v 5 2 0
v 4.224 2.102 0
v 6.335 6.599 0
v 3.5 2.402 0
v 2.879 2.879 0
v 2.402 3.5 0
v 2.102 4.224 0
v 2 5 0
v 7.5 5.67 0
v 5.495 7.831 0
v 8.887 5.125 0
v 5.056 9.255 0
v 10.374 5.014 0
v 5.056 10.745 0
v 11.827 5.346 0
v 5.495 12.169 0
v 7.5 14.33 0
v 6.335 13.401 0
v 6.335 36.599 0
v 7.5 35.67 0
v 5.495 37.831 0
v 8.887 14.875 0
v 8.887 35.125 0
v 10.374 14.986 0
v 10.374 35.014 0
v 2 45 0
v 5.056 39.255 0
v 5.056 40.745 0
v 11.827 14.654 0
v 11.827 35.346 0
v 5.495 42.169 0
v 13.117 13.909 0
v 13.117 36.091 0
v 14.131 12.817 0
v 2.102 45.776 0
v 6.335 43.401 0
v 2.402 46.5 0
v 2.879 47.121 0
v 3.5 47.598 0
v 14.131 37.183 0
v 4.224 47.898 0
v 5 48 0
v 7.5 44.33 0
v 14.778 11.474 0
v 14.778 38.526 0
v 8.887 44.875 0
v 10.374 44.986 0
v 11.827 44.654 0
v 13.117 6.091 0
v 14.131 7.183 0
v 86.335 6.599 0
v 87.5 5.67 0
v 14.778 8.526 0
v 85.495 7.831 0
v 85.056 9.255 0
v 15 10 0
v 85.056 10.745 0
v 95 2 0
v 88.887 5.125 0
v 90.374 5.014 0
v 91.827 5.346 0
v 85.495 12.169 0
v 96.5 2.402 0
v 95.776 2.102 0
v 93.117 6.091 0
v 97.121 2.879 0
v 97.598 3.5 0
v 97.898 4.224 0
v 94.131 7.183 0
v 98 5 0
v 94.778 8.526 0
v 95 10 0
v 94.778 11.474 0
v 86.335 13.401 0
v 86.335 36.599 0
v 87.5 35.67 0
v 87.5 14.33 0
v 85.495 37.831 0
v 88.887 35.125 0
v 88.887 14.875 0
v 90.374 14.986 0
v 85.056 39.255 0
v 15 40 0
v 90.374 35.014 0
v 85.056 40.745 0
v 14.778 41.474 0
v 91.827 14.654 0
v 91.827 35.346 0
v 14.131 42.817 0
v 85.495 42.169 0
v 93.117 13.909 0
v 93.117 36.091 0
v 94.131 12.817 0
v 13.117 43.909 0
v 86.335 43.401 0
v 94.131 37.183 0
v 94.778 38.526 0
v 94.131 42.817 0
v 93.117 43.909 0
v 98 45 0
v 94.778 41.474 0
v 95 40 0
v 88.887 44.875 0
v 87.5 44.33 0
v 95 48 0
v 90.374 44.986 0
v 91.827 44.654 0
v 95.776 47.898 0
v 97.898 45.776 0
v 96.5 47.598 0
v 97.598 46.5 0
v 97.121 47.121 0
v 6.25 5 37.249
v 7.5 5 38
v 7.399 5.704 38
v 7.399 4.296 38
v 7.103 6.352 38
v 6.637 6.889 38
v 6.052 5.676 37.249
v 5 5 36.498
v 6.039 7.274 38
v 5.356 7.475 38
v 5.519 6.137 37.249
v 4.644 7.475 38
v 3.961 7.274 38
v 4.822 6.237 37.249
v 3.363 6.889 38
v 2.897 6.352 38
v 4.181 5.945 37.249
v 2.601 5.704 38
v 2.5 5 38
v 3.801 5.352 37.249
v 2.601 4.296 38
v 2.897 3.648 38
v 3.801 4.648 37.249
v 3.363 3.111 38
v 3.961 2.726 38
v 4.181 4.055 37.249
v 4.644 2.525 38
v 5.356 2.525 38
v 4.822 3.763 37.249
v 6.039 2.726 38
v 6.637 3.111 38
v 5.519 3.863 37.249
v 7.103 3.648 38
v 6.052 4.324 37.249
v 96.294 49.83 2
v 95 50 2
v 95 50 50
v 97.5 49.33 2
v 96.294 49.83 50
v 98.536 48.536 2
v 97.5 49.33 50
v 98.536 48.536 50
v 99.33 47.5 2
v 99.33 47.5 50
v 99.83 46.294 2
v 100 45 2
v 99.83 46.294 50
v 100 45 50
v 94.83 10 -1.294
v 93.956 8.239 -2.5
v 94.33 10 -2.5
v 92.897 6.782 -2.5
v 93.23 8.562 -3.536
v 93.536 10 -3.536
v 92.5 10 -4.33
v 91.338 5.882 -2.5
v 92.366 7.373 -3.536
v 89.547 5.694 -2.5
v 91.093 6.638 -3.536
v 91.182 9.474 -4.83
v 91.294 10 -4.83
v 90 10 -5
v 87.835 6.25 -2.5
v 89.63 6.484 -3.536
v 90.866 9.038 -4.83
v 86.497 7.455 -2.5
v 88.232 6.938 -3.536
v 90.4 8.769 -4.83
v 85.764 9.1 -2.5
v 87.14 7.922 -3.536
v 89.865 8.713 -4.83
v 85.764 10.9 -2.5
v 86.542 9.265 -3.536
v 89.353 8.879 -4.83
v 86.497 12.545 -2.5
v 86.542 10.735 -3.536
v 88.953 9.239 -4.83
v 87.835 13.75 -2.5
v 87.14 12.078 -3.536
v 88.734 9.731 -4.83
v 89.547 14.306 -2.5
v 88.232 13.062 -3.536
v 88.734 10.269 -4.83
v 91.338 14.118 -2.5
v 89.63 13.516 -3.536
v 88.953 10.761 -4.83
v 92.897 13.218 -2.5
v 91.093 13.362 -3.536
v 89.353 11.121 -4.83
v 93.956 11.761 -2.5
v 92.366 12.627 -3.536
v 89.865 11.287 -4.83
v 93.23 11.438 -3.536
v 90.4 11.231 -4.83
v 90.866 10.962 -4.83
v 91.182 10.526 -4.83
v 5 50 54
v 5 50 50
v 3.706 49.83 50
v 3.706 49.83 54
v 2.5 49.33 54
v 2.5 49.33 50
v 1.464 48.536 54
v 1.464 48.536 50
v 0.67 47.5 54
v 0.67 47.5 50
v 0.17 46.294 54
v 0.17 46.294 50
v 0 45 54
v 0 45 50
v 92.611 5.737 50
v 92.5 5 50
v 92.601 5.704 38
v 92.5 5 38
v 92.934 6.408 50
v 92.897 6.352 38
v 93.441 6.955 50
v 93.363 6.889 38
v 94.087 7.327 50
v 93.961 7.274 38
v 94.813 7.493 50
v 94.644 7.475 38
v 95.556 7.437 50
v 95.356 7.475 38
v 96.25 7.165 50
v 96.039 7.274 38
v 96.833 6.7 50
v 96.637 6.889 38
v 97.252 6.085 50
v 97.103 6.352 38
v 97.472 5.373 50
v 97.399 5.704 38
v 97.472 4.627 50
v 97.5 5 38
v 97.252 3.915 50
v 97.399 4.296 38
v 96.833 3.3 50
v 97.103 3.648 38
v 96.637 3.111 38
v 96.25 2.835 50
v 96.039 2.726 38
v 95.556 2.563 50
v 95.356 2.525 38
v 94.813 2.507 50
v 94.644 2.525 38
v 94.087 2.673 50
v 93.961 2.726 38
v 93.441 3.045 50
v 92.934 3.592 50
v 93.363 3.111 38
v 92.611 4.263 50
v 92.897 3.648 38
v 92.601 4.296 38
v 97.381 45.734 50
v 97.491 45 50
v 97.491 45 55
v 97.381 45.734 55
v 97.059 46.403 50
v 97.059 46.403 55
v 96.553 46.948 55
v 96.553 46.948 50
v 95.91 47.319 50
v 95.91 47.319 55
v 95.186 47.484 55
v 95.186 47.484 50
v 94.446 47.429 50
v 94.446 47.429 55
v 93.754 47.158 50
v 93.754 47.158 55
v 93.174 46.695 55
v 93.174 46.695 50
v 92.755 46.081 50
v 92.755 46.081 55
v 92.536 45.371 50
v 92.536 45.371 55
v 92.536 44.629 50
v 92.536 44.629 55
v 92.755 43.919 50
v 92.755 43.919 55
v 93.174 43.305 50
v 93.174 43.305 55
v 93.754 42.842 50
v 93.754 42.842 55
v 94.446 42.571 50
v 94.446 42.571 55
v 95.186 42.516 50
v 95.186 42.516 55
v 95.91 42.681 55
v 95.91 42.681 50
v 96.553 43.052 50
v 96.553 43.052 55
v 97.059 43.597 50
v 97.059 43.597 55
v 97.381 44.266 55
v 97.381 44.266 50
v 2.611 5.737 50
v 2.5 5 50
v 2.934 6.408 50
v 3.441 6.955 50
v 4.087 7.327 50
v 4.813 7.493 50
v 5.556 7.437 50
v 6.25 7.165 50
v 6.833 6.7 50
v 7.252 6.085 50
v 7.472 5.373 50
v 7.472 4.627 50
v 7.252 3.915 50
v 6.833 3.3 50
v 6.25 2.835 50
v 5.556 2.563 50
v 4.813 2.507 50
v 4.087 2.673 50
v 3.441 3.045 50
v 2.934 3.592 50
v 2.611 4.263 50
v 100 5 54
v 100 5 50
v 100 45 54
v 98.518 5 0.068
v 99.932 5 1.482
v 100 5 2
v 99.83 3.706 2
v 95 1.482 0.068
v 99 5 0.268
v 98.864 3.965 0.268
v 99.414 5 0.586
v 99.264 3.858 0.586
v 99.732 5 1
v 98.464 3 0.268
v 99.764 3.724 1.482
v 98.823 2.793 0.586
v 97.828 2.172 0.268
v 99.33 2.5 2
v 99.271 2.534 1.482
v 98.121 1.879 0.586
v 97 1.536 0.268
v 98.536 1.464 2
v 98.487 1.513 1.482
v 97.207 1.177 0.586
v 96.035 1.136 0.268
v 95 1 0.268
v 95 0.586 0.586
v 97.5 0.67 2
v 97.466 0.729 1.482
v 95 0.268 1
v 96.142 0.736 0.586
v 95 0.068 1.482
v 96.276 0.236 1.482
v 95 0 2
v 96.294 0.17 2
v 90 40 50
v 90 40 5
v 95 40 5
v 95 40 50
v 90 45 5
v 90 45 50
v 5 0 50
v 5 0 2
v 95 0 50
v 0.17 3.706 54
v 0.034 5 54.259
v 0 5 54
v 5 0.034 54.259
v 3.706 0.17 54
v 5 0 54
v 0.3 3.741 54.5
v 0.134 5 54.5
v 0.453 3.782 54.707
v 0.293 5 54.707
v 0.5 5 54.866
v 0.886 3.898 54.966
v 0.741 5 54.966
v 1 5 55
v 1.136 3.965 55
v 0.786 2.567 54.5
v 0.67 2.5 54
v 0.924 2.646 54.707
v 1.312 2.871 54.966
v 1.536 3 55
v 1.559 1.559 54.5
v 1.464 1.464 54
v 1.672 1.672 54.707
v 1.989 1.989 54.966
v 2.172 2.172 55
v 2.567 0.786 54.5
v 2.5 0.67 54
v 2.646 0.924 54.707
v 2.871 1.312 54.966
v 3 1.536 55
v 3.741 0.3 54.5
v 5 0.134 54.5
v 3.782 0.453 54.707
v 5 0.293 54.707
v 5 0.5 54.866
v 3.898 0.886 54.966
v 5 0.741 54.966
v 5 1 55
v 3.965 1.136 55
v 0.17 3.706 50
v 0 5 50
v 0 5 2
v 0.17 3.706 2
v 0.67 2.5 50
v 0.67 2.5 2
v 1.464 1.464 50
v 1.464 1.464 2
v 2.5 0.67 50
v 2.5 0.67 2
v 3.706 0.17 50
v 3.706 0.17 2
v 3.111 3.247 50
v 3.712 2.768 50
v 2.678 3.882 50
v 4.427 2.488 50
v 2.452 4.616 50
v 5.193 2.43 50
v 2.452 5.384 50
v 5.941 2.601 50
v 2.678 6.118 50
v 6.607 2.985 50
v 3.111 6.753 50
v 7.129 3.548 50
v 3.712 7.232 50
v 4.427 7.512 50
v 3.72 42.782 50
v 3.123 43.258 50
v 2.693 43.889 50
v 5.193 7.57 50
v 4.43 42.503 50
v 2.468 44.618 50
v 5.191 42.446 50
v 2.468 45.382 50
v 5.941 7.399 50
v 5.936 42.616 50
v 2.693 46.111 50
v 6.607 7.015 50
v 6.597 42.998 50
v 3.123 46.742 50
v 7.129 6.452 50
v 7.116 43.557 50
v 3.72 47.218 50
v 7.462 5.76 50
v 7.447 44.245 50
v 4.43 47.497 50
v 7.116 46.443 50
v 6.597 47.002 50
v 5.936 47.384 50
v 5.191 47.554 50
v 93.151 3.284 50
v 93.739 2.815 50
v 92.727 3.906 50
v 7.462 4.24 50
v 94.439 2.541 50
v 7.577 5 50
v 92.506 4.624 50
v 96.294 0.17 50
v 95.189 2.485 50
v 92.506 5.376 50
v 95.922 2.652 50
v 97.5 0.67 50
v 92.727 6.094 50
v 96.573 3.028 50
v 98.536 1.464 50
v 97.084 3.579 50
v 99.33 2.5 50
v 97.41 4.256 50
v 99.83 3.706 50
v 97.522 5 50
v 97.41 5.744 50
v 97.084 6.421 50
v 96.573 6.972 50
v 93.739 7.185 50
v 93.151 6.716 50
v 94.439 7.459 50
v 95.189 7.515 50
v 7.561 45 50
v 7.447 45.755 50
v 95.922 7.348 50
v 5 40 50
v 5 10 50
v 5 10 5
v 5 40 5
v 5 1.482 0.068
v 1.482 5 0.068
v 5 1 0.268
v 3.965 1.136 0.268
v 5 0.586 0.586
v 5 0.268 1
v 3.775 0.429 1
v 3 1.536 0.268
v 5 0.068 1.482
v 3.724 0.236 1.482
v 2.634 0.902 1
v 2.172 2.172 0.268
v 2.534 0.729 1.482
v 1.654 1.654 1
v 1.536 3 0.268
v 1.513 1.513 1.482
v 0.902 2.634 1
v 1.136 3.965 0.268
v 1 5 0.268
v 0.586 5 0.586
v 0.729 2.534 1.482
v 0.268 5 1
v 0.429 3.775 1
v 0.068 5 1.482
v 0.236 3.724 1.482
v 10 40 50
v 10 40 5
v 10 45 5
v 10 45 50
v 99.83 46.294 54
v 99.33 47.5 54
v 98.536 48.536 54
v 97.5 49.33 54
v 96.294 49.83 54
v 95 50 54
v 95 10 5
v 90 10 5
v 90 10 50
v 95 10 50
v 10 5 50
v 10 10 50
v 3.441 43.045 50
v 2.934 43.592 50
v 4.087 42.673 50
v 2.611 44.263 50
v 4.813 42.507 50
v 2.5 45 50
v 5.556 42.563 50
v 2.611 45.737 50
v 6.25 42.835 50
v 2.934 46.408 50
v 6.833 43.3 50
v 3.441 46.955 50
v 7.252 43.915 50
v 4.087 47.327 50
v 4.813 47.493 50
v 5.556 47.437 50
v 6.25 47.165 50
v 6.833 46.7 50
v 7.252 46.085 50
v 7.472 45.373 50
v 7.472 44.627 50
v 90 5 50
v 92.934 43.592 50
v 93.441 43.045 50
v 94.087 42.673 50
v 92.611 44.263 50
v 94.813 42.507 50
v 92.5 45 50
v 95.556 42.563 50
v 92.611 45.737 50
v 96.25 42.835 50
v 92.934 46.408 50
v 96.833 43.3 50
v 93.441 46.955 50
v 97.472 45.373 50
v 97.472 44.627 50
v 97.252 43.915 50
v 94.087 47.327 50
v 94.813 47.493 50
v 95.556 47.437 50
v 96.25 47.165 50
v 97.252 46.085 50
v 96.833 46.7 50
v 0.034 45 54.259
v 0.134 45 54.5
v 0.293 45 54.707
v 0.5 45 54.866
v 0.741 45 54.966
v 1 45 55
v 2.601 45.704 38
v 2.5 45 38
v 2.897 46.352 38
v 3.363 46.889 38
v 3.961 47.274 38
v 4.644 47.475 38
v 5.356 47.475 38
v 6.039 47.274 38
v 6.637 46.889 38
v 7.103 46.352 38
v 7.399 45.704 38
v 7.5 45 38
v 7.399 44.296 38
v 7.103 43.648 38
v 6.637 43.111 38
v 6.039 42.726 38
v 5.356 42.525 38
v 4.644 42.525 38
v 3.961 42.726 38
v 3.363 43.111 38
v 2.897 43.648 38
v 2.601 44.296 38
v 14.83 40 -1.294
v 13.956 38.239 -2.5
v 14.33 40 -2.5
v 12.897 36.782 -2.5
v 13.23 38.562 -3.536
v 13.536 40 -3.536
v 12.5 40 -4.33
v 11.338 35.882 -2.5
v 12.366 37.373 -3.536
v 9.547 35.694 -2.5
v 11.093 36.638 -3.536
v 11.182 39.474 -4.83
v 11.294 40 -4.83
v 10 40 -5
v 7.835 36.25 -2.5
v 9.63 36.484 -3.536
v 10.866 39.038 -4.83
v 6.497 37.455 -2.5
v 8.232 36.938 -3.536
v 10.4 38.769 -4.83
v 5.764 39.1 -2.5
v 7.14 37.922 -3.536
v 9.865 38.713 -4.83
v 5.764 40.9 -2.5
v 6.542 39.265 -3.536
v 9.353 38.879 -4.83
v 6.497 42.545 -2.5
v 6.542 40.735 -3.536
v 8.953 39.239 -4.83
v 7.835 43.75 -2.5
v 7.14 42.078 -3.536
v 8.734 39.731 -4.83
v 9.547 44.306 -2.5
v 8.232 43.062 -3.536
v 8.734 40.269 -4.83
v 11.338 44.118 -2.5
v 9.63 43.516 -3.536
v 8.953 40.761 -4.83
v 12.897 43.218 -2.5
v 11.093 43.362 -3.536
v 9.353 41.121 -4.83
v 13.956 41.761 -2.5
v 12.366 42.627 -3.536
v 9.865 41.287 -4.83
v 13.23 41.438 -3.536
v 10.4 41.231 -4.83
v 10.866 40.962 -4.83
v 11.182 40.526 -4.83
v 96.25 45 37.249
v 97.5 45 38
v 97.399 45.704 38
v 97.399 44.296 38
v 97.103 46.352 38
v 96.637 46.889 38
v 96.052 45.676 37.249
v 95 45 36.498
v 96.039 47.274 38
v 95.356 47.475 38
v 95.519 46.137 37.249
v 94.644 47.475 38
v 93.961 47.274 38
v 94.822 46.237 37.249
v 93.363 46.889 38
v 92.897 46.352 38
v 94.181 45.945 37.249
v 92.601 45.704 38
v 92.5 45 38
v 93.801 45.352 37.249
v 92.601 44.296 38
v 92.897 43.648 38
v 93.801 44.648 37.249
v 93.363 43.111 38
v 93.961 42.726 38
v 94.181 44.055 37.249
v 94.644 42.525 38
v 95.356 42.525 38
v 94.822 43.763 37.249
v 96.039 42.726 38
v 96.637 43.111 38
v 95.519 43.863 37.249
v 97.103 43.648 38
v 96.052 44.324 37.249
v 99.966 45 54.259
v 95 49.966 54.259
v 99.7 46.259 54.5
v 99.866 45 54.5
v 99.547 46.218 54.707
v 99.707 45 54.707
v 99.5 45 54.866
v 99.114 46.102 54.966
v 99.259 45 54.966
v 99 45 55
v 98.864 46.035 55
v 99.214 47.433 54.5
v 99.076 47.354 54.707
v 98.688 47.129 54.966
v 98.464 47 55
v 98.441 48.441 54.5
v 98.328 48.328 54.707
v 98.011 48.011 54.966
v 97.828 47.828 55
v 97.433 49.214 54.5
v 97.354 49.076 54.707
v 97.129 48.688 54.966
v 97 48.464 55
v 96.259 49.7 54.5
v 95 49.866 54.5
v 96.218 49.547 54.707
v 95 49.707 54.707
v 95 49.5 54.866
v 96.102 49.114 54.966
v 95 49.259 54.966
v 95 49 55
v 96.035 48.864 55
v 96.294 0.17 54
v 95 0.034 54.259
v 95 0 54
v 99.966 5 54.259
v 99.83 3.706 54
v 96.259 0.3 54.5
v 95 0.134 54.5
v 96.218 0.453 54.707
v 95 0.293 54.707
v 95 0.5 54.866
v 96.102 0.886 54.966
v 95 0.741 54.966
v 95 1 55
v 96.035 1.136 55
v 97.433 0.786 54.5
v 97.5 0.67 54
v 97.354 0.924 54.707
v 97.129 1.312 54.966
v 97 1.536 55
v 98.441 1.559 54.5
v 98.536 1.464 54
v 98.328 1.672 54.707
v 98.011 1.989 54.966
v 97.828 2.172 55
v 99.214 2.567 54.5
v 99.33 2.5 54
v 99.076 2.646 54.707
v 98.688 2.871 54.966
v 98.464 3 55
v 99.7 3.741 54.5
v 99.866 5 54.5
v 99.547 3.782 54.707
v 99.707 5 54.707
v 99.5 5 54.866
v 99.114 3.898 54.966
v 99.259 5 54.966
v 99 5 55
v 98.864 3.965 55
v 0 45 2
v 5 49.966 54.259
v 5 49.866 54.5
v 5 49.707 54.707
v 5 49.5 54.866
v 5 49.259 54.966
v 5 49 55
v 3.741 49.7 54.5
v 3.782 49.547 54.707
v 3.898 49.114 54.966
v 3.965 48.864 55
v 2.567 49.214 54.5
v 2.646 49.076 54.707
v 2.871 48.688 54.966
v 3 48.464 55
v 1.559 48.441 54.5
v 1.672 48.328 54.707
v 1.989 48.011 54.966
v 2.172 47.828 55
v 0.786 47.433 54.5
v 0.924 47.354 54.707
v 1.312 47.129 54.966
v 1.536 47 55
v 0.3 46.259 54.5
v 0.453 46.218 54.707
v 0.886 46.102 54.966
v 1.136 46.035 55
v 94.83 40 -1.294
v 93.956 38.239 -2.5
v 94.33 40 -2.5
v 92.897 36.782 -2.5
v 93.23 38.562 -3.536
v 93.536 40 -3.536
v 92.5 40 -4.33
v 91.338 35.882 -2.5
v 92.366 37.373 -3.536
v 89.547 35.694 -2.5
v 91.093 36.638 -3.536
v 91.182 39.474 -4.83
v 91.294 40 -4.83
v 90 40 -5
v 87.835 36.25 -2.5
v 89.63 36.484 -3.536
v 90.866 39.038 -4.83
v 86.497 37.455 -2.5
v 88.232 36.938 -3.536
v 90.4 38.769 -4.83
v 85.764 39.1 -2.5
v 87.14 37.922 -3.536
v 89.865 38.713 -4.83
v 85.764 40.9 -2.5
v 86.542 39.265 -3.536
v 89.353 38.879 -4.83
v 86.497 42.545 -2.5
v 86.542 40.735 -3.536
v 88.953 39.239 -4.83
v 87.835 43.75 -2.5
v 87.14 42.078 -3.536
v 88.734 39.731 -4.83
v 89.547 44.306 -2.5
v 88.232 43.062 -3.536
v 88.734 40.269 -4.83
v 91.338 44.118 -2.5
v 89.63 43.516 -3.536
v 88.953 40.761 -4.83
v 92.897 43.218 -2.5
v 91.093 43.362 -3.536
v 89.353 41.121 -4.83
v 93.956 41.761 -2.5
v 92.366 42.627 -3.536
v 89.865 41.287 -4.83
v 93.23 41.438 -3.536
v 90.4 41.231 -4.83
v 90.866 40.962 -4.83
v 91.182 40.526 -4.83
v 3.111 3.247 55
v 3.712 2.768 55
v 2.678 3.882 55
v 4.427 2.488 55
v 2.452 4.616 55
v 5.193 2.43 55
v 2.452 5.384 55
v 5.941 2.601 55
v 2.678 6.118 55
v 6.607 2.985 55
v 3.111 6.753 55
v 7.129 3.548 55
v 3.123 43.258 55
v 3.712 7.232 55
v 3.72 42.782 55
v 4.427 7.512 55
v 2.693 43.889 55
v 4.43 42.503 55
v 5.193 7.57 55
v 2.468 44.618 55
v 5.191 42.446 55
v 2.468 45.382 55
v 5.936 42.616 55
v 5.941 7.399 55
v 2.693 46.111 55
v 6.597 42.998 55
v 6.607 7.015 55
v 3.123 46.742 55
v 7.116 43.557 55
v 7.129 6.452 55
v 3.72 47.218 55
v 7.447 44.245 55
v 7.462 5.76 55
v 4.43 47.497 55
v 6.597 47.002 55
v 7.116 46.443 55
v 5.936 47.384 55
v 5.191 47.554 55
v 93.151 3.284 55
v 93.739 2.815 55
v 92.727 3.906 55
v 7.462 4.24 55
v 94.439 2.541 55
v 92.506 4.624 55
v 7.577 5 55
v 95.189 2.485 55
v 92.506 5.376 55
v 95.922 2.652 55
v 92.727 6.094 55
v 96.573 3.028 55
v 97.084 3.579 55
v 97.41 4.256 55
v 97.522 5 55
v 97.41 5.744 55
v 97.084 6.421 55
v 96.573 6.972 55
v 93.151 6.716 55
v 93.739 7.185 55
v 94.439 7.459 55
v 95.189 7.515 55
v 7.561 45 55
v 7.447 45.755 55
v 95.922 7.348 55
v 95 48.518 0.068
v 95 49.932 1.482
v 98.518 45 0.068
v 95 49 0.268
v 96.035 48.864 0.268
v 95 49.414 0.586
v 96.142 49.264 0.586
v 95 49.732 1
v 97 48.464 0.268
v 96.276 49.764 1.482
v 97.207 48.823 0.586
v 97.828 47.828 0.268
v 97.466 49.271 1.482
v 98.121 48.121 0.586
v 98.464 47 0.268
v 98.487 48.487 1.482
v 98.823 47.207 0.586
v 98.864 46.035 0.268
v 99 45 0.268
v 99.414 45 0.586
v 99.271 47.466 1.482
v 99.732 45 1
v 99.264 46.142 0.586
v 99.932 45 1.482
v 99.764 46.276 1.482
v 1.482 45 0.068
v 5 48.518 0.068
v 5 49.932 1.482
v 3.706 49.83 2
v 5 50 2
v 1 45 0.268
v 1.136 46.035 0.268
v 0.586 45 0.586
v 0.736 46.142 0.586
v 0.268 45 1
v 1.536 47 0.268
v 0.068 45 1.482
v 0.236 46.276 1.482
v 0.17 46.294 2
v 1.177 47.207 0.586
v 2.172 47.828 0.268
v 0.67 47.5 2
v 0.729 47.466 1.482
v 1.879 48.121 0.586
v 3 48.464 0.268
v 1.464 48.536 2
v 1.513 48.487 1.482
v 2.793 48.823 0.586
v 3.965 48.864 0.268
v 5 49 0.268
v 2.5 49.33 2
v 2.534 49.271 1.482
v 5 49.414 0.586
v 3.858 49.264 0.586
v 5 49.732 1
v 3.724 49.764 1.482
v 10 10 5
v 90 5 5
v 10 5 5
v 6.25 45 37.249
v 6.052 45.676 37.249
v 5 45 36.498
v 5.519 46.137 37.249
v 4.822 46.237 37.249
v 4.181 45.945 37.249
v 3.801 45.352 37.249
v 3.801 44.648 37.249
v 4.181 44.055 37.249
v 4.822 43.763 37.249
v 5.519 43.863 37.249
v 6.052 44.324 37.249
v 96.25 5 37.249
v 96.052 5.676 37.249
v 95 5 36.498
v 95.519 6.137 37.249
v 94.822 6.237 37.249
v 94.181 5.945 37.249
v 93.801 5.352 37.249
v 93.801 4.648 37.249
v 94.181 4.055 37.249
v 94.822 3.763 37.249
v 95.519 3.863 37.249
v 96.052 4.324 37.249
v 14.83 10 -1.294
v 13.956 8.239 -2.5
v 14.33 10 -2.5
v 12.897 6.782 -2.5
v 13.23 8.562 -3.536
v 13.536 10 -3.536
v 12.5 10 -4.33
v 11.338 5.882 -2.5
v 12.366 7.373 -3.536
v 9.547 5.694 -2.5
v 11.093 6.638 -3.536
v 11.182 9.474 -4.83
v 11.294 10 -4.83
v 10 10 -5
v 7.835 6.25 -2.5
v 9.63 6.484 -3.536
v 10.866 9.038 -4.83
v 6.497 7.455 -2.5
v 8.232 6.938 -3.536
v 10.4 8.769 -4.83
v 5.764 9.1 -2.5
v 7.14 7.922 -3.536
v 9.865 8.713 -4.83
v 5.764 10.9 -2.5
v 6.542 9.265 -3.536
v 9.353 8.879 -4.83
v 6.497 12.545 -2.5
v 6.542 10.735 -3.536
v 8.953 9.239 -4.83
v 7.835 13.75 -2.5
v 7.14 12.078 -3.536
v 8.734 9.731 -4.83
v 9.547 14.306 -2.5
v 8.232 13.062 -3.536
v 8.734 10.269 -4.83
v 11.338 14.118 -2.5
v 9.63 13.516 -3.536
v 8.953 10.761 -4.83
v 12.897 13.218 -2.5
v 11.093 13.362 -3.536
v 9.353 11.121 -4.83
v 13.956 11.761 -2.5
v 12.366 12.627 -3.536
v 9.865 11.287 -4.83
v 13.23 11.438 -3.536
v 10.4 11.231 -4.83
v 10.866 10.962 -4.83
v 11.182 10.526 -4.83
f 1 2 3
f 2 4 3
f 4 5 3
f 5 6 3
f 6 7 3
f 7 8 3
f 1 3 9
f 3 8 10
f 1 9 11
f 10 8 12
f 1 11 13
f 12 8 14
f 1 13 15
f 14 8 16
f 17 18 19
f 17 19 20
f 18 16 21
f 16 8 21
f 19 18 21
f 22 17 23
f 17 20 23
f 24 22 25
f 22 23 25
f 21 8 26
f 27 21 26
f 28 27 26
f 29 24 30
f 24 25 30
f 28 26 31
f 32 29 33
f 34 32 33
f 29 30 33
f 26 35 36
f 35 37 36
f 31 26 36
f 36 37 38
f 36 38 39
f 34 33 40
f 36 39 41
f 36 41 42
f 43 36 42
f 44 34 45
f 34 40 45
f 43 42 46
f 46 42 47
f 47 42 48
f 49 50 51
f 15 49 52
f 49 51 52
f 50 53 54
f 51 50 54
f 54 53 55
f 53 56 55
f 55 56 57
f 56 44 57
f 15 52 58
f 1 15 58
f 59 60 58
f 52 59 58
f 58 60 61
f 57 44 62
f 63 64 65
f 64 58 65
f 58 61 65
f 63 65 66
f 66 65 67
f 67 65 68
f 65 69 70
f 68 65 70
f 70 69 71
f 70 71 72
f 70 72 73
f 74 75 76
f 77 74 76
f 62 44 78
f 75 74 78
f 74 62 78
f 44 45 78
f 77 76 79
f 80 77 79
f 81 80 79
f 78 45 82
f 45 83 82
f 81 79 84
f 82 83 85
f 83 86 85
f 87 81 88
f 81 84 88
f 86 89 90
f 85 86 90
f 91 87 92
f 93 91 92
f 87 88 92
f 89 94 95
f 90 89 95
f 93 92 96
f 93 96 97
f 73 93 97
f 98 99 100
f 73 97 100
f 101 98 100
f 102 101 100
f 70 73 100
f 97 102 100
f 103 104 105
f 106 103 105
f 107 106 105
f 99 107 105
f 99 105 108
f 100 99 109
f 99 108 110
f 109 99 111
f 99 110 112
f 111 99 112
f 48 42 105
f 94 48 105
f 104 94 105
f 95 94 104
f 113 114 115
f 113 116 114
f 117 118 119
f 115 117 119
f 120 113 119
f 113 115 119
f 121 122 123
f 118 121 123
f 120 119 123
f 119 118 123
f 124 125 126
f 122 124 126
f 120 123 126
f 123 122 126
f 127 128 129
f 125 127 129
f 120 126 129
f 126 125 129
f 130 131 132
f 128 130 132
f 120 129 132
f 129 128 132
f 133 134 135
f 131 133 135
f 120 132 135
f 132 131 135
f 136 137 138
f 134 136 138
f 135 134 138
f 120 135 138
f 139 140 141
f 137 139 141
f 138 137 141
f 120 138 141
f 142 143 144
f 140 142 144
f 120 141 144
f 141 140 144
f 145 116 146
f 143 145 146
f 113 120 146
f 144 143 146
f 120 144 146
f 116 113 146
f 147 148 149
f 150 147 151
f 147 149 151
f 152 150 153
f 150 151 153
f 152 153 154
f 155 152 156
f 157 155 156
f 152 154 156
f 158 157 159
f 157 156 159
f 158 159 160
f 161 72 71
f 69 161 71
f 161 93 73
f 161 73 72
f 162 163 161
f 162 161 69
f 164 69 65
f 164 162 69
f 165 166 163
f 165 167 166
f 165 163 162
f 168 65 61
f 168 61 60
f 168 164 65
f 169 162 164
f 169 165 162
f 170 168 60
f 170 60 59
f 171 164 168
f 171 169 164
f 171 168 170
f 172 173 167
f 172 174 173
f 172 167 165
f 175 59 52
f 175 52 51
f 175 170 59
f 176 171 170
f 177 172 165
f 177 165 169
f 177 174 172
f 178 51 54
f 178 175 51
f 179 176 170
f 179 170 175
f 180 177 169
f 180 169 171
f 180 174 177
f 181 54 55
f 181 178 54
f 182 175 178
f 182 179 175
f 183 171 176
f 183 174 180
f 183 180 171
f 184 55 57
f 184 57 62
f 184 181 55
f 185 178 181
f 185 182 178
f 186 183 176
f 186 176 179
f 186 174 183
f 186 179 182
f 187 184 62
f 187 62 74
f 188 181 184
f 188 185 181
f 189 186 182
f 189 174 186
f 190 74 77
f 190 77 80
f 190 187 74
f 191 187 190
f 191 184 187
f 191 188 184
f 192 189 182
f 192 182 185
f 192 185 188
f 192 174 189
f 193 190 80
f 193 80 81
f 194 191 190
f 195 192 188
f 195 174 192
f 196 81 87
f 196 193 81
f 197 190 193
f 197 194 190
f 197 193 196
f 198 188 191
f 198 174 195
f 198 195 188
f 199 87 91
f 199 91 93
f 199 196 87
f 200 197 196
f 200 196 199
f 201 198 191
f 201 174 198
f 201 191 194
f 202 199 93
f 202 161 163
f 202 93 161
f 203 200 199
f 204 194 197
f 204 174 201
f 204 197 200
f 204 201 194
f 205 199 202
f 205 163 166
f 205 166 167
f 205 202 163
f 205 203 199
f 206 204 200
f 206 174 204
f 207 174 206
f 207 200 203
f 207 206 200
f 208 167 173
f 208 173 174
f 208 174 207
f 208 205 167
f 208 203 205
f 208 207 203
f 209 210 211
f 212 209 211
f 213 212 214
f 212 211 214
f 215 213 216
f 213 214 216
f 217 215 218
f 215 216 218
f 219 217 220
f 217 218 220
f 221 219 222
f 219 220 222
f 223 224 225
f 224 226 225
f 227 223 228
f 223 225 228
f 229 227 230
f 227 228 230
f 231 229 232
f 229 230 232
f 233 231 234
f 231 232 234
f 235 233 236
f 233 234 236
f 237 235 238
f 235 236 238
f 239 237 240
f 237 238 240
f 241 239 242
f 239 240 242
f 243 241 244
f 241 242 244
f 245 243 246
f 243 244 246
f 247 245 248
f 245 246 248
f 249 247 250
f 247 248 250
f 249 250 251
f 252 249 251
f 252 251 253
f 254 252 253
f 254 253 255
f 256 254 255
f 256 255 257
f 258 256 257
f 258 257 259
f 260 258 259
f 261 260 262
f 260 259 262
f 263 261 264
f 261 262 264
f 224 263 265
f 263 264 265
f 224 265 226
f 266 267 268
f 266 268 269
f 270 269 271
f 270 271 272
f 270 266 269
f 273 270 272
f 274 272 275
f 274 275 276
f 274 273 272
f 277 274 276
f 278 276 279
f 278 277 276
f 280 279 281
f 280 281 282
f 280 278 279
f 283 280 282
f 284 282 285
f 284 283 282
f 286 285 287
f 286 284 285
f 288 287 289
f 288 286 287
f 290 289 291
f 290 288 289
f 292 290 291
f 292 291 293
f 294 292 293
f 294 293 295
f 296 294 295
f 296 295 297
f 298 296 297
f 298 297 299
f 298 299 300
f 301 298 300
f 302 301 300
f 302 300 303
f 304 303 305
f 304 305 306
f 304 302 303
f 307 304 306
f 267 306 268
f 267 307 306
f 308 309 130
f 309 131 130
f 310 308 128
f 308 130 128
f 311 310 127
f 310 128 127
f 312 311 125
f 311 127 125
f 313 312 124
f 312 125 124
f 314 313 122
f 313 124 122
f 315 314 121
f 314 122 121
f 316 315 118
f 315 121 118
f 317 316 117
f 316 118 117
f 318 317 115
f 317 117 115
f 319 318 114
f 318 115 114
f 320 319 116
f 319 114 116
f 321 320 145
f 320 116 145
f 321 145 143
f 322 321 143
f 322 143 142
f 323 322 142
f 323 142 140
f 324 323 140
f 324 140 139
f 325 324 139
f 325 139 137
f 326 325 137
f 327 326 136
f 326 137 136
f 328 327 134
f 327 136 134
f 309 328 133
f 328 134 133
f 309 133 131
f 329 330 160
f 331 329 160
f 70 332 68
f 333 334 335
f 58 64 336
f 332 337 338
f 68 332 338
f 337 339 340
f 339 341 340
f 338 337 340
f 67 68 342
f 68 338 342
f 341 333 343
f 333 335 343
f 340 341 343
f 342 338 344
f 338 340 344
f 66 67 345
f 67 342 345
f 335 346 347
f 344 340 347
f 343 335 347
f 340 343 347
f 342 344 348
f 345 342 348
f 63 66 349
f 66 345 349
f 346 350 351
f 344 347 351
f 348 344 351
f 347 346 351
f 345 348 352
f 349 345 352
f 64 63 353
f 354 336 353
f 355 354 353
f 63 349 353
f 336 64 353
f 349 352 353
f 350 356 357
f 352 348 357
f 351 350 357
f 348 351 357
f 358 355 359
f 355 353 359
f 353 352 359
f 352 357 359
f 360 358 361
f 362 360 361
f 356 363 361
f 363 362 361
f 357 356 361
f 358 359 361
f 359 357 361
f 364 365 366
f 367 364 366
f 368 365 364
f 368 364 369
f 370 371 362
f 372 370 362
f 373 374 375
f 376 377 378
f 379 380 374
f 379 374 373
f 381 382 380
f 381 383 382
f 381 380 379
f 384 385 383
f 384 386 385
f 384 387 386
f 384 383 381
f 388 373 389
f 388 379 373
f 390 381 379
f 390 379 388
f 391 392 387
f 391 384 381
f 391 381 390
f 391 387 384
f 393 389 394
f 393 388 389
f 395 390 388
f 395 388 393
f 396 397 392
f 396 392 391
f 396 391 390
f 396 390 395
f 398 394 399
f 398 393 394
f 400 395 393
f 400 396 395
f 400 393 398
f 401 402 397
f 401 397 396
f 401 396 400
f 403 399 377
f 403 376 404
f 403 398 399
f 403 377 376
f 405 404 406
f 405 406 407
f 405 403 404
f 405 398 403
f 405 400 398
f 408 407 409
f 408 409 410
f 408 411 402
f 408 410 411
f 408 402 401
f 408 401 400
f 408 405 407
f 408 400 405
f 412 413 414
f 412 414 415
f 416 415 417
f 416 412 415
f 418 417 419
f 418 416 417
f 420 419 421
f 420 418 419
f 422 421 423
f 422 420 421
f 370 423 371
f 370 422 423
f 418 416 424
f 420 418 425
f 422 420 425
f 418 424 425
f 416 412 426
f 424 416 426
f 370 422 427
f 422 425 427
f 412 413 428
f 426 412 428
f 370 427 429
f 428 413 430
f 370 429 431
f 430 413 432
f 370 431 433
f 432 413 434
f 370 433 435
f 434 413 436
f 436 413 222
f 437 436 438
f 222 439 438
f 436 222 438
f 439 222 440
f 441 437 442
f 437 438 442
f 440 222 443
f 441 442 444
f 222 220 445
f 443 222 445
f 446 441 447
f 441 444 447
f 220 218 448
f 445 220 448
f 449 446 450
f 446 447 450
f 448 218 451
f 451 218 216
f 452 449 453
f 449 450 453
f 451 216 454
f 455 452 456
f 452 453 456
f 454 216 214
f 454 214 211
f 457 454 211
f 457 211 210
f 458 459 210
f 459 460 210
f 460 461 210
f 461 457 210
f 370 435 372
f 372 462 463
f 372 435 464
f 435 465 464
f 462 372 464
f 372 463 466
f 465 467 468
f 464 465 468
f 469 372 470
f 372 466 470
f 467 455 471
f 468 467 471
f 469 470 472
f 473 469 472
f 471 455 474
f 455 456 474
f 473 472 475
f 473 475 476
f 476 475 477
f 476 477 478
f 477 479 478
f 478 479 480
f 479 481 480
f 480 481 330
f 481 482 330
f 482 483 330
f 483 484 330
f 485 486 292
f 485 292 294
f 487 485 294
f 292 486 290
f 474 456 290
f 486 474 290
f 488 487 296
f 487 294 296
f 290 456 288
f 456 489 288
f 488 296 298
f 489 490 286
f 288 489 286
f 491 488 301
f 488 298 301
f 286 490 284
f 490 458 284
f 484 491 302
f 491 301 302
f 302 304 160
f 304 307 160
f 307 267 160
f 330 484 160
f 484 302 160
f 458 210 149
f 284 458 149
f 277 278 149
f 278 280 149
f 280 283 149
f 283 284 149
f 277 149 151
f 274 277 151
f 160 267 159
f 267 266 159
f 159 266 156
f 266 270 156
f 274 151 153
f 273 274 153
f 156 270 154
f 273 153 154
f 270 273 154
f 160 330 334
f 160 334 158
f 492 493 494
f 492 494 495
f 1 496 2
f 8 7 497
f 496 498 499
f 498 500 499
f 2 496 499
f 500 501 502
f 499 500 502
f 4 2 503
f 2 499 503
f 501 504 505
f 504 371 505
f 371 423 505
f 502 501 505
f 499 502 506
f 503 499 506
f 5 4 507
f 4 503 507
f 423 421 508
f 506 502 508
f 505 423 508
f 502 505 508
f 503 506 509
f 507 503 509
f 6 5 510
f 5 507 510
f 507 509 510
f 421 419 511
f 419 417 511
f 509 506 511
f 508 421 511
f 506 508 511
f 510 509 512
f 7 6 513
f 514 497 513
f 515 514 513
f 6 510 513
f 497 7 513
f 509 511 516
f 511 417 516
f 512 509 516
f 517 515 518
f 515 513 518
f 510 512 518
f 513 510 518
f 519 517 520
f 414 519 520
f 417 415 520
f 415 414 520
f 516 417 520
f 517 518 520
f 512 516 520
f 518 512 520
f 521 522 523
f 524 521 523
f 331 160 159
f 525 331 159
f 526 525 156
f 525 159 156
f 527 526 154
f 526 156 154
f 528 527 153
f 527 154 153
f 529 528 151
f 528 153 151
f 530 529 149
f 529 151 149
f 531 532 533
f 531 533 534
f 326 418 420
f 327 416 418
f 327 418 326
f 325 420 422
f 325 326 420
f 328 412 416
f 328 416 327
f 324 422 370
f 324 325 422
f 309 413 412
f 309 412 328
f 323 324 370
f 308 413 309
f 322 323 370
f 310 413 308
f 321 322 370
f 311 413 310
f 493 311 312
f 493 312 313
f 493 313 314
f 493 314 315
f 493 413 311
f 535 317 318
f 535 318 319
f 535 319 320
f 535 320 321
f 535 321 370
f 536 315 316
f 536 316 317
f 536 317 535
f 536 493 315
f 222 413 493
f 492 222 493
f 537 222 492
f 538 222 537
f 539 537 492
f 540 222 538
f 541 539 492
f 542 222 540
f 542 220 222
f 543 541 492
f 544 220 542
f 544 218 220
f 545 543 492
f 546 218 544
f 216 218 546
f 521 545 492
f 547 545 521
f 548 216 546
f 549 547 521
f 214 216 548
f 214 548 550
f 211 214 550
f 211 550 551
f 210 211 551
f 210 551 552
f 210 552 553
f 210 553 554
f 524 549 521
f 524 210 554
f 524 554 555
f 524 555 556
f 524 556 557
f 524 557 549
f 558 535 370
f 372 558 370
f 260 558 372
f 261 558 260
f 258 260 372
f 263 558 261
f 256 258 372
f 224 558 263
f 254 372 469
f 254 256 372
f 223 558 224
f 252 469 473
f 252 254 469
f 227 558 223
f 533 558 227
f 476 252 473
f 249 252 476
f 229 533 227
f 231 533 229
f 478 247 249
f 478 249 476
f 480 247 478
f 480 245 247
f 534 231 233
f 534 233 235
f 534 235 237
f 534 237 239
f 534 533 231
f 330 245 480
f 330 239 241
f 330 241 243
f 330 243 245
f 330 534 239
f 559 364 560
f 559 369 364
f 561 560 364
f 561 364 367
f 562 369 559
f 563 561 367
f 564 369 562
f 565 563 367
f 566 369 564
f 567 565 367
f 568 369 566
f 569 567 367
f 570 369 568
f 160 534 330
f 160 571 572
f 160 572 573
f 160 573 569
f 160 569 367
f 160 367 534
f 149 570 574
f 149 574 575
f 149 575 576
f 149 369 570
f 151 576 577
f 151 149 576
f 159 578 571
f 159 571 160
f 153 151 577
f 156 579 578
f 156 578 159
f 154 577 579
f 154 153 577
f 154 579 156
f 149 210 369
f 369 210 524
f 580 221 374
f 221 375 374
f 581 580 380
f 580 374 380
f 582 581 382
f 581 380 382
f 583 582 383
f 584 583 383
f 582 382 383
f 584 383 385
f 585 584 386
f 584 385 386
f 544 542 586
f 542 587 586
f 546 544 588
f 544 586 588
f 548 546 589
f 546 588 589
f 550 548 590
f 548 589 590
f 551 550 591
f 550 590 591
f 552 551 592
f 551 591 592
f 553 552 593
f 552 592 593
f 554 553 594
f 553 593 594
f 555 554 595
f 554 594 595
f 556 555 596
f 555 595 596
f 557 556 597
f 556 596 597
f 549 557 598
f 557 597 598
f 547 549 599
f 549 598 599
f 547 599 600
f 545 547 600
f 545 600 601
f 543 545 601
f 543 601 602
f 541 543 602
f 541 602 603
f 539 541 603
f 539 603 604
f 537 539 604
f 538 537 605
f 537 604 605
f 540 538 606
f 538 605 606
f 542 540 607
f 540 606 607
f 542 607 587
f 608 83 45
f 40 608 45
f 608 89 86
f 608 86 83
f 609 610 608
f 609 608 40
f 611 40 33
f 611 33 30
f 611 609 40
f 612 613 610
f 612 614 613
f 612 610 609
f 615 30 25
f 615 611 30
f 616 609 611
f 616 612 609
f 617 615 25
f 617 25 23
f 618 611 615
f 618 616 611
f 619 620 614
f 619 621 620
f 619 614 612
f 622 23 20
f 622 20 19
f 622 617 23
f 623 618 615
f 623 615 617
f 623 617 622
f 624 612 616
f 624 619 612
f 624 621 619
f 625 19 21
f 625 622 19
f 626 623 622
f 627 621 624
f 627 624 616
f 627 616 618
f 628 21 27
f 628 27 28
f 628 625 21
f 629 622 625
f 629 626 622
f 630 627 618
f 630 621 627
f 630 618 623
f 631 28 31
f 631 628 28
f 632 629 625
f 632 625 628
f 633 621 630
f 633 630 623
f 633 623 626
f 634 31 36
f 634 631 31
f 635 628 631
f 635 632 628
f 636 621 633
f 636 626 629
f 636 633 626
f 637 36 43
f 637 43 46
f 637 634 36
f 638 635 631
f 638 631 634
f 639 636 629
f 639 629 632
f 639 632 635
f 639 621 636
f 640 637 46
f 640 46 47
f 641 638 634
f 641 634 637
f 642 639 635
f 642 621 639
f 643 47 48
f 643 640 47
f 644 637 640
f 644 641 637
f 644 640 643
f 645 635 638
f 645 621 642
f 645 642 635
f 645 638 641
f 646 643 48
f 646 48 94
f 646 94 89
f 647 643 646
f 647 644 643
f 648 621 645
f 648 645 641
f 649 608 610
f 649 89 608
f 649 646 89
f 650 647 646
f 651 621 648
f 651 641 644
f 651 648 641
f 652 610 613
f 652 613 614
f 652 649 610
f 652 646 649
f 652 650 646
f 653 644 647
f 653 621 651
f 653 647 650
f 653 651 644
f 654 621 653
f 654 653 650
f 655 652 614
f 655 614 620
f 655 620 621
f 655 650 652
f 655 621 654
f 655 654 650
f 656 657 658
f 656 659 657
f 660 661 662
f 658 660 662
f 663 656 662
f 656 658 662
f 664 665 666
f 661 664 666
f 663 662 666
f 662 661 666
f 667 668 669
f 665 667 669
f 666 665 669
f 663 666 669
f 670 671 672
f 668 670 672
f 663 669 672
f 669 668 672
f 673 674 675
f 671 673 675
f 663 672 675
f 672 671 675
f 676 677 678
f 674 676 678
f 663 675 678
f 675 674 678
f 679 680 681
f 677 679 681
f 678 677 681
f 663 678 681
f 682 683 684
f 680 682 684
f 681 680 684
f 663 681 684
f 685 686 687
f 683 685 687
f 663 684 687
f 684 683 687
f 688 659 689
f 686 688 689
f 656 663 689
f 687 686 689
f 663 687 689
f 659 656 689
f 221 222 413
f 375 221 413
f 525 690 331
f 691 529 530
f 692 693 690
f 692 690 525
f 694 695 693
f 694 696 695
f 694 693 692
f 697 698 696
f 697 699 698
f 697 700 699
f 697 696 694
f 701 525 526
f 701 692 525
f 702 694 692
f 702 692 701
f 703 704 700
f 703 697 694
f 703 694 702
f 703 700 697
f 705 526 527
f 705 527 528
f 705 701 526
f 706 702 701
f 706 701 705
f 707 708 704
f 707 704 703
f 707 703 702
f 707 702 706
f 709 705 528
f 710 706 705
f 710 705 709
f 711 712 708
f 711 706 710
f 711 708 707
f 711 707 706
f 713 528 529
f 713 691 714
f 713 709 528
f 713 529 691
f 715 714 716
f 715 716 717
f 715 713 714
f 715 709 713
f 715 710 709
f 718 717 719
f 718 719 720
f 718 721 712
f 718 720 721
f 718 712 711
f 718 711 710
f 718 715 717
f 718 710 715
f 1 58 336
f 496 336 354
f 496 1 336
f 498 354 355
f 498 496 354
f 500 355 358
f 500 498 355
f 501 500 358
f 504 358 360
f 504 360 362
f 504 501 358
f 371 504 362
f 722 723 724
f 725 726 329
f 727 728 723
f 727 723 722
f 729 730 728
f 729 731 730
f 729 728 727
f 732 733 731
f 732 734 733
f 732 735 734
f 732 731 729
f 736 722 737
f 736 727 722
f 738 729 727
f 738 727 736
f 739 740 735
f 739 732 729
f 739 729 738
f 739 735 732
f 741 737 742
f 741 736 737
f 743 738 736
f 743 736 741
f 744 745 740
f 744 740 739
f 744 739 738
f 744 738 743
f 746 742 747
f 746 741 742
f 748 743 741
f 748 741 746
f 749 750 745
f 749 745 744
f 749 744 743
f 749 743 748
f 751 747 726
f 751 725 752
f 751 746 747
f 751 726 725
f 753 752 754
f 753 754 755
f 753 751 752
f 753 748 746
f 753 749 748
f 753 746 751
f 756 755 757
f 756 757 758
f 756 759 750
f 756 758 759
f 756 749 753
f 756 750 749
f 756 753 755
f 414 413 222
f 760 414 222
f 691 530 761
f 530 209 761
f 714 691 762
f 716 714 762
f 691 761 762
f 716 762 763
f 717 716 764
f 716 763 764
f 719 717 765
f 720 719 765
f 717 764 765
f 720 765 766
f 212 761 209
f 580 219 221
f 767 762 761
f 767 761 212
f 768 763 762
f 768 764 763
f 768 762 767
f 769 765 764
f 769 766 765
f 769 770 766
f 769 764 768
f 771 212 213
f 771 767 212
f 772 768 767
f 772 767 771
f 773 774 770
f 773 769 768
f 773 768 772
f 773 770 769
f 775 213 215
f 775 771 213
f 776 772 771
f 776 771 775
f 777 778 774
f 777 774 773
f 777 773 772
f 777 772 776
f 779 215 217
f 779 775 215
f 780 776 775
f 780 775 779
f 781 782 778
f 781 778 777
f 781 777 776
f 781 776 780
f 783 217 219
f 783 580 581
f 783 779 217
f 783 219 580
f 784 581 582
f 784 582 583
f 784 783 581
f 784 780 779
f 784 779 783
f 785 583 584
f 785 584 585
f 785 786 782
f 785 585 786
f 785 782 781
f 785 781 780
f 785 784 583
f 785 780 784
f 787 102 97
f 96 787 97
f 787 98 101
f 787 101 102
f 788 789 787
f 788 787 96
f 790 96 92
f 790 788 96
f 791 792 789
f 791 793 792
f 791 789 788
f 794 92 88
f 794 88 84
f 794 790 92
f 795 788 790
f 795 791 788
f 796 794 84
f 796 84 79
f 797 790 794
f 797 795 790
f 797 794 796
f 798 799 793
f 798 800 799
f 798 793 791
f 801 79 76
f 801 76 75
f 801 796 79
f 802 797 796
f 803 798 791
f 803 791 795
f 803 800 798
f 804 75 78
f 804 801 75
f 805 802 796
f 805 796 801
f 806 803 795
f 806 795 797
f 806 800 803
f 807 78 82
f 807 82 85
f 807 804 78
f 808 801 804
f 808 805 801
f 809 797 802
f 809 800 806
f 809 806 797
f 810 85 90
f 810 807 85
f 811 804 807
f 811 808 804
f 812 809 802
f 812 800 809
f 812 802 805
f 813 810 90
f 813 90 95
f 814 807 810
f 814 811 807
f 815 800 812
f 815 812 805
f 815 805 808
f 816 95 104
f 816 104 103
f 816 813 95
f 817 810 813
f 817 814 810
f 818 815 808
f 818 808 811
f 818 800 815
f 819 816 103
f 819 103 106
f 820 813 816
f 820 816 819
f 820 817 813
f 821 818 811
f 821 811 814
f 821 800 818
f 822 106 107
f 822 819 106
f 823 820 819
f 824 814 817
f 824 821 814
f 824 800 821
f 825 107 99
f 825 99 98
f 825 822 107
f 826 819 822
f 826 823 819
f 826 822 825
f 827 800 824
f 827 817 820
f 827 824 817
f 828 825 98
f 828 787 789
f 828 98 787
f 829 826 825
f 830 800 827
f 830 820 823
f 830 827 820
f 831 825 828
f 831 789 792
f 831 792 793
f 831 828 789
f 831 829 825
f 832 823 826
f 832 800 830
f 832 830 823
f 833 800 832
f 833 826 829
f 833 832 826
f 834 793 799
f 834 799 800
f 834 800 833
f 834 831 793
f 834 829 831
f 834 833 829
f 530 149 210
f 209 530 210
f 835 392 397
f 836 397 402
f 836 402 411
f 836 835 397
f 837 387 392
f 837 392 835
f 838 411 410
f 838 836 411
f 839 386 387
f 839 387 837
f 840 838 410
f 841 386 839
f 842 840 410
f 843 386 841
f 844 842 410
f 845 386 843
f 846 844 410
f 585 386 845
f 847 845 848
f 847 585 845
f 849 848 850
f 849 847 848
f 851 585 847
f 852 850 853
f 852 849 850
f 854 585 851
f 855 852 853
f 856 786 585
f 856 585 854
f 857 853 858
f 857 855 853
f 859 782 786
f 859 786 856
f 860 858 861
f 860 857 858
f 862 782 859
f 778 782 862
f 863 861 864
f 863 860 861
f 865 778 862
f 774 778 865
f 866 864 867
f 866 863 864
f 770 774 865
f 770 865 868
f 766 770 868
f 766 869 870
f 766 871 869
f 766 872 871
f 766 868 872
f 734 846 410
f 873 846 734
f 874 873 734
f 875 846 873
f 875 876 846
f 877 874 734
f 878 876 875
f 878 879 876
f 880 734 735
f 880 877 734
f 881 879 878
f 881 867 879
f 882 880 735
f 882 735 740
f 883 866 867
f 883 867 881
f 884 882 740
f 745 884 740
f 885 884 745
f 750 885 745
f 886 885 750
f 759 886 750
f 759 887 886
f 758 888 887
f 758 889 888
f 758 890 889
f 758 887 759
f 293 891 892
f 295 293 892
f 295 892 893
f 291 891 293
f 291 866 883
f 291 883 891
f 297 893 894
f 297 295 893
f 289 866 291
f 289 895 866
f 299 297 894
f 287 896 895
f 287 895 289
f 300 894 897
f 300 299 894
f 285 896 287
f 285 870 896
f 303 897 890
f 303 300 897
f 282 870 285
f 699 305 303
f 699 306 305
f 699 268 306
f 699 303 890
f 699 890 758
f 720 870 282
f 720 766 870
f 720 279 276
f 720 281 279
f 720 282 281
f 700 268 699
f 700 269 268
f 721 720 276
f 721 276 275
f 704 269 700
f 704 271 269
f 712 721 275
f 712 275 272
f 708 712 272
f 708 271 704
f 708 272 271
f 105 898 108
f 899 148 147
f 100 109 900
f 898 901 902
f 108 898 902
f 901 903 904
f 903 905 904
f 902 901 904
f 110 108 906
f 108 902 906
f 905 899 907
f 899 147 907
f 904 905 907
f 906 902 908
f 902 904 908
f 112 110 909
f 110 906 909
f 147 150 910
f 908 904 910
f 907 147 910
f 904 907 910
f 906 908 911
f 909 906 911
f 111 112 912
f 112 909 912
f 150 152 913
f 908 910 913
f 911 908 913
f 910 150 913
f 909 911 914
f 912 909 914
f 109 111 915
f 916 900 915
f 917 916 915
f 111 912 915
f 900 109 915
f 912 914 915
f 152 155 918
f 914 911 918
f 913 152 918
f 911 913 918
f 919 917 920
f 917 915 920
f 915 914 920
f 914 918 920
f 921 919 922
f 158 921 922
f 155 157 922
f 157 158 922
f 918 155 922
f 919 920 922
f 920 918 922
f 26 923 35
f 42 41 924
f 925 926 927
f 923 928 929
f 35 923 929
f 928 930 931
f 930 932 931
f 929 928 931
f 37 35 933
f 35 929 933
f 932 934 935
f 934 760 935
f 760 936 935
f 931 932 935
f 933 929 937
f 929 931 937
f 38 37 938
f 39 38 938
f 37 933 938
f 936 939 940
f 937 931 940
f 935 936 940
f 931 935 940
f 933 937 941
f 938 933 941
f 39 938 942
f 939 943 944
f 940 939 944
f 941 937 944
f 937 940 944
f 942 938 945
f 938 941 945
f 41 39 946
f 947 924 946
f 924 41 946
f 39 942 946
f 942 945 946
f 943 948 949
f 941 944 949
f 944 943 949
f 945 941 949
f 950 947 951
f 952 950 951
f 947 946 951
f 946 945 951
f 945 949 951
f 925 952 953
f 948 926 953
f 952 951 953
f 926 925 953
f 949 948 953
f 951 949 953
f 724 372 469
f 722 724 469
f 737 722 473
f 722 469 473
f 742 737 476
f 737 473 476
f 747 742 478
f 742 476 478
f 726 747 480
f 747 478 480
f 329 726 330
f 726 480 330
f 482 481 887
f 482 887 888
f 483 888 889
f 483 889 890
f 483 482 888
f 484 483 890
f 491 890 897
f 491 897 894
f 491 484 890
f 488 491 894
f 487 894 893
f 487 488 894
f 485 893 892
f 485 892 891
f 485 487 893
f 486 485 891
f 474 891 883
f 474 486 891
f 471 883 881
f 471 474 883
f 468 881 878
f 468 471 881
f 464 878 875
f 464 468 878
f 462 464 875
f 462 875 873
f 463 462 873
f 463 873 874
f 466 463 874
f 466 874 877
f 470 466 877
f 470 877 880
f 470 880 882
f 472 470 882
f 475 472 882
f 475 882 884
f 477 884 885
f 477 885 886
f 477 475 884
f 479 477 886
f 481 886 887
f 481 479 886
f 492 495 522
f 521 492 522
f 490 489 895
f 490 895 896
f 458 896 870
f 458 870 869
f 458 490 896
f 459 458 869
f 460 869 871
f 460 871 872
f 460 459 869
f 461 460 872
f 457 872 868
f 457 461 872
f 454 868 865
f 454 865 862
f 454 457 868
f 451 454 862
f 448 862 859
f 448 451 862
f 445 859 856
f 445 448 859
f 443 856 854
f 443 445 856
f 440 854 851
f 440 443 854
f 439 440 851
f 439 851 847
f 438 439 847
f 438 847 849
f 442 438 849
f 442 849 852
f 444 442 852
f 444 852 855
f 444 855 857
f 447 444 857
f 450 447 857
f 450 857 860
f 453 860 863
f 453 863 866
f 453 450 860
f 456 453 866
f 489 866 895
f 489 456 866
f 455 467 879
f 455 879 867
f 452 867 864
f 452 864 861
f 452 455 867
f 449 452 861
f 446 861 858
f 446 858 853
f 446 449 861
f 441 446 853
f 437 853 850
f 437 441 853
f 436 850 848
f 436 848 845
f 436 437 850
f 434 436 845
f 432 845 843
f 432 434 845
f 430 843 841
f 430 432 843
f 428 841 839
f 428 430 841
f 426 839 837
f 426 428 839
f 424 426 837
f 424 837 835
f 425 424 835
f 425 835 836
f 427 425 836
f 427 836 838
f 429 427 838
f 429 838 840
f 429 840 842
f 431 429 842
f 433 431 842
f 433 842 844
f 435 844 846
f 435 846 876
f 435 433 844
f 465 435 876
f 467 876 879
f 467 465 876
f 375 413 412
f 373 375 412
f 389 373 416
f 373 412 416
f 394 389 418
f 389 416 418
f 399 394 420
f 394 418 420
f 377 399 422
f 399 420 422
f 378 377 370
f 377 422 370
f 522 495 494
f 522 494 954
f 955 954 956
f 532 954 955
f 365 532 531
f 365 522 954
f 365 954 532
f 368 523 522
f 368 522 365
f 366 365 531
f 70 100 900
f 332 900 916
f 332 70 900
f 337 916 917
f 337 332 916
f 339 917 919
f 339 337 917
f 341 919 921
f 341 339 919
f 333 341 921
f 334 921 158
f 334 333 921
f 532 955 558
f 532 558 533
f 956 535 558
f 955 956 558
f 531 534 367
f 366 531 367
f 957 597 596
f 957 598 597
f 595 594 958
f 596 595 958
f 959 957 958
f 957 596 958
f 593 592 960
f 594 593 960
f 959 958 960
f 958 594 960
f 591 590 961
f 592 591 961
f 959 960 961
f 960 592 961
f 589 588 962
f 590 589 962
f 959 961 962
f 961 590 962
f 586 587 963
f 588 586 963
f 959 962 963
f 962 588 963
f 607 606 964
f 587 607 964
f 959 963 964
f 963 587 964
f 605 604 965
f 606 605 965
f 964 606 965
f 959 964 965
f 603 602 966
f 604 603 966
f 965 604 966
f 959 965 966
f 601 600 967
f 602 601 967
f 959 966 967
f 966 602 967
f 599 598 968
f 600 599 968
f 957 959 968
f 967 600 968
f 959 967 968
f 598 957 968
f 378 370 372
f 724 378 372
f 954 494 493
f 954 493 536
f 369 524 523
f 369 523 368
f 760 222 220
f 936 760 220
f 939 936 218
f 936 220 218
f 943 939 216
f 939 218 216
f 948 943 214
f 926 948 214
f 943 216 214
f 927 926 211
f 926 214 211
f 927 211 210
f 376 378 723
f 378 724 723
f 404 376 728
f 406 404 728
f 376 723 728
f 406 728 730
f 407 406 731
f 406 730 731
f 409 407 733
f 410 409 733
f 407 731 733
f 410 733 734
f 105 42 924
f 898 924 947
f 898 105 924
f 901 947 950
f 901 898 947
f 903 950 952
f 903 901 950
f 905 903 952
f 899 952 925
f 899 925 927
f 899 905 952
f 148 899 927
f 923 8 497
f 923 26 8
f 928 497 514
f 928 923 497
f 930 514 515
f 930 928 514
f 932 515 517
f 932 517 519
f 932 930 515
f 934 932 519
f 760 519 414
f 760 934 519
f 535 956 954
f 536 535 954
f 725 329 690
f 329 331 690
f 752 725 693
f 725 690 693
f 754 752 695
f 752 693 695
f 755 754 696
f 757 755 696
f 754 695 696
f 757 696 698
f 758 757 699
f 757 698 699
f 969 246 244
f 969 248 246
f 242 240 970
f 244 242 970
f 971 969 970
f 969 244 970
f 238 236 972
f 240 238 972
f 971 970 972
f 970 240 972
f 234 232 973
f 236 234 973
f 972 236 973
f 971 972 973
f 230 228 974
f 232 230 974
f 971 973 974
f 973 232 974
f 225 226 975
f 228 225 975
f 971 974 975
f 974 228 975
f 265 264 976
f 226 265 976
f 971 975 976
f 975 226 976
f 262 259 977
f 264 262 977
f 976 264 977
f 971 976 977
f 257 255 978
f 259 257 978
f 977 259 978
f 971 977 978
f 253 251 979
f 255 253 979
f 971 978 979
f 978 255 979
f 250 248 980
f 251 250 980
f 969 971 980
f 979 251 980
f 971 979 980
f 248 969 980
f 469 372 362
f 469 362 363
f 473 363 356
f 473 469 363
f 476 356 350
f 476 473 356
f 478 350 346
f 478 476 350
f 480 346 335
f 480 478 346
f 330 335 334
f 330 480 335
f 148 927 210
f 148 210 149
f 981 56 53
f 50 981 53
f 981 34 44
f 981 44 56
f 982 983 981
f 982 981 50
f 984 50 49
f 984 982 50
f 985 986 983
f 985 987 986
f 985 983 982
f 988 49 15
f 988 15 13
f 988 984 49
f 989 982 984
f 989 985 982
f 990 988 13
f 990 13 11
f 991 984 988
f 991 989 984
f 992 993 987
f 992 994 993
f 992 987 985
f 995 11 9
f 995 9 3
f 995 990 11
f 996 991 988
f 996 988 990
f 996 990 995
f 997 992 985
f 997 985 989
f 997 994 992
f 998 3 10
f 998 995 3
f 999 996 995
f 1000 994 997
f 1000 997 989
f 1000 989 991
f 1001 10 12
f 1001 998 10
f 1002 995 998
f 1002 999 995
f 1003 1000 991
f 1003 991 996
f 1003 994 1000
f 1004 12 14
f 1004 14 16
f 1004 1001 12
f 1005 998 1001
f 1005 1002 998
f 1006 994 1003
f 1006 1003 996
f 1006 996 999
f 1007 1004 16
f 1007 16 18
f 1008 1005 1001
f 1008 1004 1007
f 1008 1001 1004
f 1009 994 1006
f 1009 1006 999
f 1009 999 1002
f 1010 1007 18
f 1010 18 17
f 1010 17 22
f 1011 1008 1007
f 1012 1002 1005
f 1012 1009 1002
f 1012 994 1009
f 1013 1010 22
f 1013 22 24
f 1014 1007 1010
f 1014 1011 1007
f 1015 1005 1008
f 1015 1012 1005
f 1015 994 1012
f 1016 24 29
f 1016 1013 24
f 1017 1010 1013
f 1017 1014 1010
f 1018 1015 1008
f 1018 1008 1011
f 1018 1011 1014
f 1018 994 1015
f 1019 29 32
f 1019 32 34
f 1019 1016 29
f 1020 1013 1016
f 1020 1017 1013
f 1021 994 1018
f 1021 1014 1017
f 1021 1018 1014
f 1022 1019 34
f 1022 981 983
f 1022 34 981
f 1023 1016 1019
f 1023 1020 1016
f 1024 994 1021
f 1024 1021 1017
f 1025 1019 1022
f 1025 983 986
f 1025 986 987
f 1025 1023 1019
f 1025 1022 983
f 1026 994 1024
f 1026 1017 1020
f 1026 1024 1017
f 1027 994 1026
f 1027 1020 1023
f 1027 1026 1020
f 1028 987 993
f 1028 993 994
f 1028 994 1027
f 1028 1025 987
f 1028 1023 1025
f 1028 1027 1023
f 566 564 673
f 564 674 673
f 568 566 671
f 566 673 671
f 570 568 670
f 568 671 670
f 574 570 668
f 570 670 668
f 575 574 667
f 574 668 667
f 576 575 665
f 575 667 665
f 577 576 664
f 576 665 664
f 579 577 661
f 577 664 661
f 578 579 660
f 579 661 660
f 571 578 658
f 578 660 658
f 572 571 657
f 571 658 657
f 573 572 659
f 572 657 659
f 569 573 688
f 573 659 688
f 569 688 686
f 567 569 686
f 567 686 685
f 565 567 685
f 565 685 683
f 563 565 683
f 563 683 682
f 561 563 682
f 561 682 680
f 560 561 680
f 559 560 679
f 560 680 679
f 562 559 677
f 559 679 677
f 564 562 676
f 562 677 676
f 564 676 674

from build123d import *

# Parameters (mm, degrees)
F0_W      = 100
F0_H      = 50
F1_DEPTH  = 50
F2_W      = 90
F2_H      = 40.0000010431
F3_DEPTH  = 45
F4_W      = 5
F4_H      = 5
F5_DEPTH  = 45
F7_D      = 5
F7_DEPTH  = 12
F7_TIP    = 1.5021515476
F8_R      = 5
F9_R      = 2.5769210798
F9_R_2    = 2.5224628813
F9_R_3    = 2.5607989108
F9_R_4    = 2.4914116102
F10_DEPTH = 5
F11_R     = 5
F12_DEPTH = 5
F13_R     = 4.99999
F14_R     = 2
F15_R     = 1


# Not quite as in the source:
# - a fillet or chamfer is up to 0.001 mm smaller than in the source, because OpenCascade refuses the exact size


with BuildPart() as f1:
    # F0 (on Top) → F1 (new body)
    with BuildSketch(Plane.XY):
        with Locations((50, 25)):
            Rectangle(F0_W, F0_H)
    extrude(amount=F1_DEPTH)

    # F2 (on face) → F3 (cut)
    with BuildSketch(Plane.XY.offset(50)):
        with Locations((50, 25.0000005215)):
            Rectangle(F2_W, F2_H)
    extrude(amount=-F3_DEPTH, mode=Mode.SUBTRACT)

    # F4 (on face) → F5 (join)
    with BuildSketch(Plane.XY.offset(5)):
        with Locations((7.5, 42.5000010431)):
            Rectangle(F4_W, F4_H)
        with Locations((7.5, 7.5)):
            Rectangle(F4_W, F4_H)
        with Locations((92.5, 42.5000010431)):
            Rectangle(F4_W, F4_H)
        with Locations((92.5, 7.5)):
            Rectangle(F4_W, F4_H)
    extrude(amount=F5_DEPTH)

    # F7
    with Locations(Plane.XY.offset(50)):
        with Locations((5, 45.0000010431), (5, 5), (95, 5), (95, 45.0000010431)):
            Hole(F7_D / 2, depth=F7_DEPTH)
            with Locations((0, 0, -(F7_DEPTH + F7_TIP / 2))):  # 118° drill point
                Cone(0, F7_D / 2, F7_TIP, mode=Mode.SUBTRACT)

    # F8
    f8_edges = [f1.edges().sort_by_distance(p)[0] for p in [
        (0, 0, 25),
        (0, 50, 25),
        (100, 50, 25),
        (100, 0, 25),
    ]]
    fillet(f8_edges, radius=F8_R)

    # F11 (on face) → F12 (join)
    with BuildSketch(Plane(origin=(0, 0, 0), x_dir=(1, 0, 0), z_dir=(0, 0, -1))):
        with Locations((10, -10)):
            Circle(F11_R)
        with Locations((90, -10)):
            Circle(F11_R)
        with Locations((90, -40)):
            Circle(F11_R)
        with Locations((10, -40)):
            Circle(F11_R)
    extrude(amount=F12_DEPTH)

    # F13 (radius 5 in the source; OpenCascade refuses exactly that, so slightly less here)
    f13_edges = [f1.edges().sort_by_distance(p)[0] for p in [
        (5, 10, -5),
        (5, 40, -5),
        (85, 10, -5),
        (85, 40, -5),
    ]]
    fillet(f13_edges, radius=F13_R)

    # F14
    f14_edges = [f1.edges().sort_by_distance(p)[0] for p in [
        (0, 25, 0),
    ]]
    fillet(f14_edges, radius=F14_R)


with BuildPart() as f10:
    # F9 (on face) → F10 (new body)
    with BuildSketch(Plane.XY.offset(50)):
        with BuildLine():
            Line((95, 50), (5, 50))
            ThreePointArc((5, 50), (1.4644660941, 48.5355339059), (0, 45))
            Line((0, 45), (0, 5))
            ThreePointArc((0, 5), (1.4644660941, 1.4644660941), (5, 0))
            Line((5, 0), (95, 0))
            ThreePointArc((95, 0), (98.5355339059, 1.4644660941), (100, 5))
            Line((100, 5), (100, 45))
            ThreePointArc((100, 45), (98.5355339059, 48.5355339059), (95, 50))
        make_face()
        with Locations((5, 5)):
            Circle(F9_R, mode=Mode.SUBTRACT)
        with Locations((95, 5)):
            Circle(F9_R_2, mode=Mode.SUBTRACT)
        with Locations((5, 45.0000010431)):
            Circle(F9_R_3, mode=Mode.SUBTRACT)
        with Locations((95, 45.0000010431)):
            Circle(F9_R_4, mode=Mode.SUBTRACT)
    extrude(amount=F10_DEPTH)

    # F15
    f15_edges = [f10.edges().sort_by_distance(p)[0] for p in [
        (50, 50, 55),
    ]]
    fillet(f15_edges, radius=F15_R)


solid = Compound([f1.part, f10.part])
